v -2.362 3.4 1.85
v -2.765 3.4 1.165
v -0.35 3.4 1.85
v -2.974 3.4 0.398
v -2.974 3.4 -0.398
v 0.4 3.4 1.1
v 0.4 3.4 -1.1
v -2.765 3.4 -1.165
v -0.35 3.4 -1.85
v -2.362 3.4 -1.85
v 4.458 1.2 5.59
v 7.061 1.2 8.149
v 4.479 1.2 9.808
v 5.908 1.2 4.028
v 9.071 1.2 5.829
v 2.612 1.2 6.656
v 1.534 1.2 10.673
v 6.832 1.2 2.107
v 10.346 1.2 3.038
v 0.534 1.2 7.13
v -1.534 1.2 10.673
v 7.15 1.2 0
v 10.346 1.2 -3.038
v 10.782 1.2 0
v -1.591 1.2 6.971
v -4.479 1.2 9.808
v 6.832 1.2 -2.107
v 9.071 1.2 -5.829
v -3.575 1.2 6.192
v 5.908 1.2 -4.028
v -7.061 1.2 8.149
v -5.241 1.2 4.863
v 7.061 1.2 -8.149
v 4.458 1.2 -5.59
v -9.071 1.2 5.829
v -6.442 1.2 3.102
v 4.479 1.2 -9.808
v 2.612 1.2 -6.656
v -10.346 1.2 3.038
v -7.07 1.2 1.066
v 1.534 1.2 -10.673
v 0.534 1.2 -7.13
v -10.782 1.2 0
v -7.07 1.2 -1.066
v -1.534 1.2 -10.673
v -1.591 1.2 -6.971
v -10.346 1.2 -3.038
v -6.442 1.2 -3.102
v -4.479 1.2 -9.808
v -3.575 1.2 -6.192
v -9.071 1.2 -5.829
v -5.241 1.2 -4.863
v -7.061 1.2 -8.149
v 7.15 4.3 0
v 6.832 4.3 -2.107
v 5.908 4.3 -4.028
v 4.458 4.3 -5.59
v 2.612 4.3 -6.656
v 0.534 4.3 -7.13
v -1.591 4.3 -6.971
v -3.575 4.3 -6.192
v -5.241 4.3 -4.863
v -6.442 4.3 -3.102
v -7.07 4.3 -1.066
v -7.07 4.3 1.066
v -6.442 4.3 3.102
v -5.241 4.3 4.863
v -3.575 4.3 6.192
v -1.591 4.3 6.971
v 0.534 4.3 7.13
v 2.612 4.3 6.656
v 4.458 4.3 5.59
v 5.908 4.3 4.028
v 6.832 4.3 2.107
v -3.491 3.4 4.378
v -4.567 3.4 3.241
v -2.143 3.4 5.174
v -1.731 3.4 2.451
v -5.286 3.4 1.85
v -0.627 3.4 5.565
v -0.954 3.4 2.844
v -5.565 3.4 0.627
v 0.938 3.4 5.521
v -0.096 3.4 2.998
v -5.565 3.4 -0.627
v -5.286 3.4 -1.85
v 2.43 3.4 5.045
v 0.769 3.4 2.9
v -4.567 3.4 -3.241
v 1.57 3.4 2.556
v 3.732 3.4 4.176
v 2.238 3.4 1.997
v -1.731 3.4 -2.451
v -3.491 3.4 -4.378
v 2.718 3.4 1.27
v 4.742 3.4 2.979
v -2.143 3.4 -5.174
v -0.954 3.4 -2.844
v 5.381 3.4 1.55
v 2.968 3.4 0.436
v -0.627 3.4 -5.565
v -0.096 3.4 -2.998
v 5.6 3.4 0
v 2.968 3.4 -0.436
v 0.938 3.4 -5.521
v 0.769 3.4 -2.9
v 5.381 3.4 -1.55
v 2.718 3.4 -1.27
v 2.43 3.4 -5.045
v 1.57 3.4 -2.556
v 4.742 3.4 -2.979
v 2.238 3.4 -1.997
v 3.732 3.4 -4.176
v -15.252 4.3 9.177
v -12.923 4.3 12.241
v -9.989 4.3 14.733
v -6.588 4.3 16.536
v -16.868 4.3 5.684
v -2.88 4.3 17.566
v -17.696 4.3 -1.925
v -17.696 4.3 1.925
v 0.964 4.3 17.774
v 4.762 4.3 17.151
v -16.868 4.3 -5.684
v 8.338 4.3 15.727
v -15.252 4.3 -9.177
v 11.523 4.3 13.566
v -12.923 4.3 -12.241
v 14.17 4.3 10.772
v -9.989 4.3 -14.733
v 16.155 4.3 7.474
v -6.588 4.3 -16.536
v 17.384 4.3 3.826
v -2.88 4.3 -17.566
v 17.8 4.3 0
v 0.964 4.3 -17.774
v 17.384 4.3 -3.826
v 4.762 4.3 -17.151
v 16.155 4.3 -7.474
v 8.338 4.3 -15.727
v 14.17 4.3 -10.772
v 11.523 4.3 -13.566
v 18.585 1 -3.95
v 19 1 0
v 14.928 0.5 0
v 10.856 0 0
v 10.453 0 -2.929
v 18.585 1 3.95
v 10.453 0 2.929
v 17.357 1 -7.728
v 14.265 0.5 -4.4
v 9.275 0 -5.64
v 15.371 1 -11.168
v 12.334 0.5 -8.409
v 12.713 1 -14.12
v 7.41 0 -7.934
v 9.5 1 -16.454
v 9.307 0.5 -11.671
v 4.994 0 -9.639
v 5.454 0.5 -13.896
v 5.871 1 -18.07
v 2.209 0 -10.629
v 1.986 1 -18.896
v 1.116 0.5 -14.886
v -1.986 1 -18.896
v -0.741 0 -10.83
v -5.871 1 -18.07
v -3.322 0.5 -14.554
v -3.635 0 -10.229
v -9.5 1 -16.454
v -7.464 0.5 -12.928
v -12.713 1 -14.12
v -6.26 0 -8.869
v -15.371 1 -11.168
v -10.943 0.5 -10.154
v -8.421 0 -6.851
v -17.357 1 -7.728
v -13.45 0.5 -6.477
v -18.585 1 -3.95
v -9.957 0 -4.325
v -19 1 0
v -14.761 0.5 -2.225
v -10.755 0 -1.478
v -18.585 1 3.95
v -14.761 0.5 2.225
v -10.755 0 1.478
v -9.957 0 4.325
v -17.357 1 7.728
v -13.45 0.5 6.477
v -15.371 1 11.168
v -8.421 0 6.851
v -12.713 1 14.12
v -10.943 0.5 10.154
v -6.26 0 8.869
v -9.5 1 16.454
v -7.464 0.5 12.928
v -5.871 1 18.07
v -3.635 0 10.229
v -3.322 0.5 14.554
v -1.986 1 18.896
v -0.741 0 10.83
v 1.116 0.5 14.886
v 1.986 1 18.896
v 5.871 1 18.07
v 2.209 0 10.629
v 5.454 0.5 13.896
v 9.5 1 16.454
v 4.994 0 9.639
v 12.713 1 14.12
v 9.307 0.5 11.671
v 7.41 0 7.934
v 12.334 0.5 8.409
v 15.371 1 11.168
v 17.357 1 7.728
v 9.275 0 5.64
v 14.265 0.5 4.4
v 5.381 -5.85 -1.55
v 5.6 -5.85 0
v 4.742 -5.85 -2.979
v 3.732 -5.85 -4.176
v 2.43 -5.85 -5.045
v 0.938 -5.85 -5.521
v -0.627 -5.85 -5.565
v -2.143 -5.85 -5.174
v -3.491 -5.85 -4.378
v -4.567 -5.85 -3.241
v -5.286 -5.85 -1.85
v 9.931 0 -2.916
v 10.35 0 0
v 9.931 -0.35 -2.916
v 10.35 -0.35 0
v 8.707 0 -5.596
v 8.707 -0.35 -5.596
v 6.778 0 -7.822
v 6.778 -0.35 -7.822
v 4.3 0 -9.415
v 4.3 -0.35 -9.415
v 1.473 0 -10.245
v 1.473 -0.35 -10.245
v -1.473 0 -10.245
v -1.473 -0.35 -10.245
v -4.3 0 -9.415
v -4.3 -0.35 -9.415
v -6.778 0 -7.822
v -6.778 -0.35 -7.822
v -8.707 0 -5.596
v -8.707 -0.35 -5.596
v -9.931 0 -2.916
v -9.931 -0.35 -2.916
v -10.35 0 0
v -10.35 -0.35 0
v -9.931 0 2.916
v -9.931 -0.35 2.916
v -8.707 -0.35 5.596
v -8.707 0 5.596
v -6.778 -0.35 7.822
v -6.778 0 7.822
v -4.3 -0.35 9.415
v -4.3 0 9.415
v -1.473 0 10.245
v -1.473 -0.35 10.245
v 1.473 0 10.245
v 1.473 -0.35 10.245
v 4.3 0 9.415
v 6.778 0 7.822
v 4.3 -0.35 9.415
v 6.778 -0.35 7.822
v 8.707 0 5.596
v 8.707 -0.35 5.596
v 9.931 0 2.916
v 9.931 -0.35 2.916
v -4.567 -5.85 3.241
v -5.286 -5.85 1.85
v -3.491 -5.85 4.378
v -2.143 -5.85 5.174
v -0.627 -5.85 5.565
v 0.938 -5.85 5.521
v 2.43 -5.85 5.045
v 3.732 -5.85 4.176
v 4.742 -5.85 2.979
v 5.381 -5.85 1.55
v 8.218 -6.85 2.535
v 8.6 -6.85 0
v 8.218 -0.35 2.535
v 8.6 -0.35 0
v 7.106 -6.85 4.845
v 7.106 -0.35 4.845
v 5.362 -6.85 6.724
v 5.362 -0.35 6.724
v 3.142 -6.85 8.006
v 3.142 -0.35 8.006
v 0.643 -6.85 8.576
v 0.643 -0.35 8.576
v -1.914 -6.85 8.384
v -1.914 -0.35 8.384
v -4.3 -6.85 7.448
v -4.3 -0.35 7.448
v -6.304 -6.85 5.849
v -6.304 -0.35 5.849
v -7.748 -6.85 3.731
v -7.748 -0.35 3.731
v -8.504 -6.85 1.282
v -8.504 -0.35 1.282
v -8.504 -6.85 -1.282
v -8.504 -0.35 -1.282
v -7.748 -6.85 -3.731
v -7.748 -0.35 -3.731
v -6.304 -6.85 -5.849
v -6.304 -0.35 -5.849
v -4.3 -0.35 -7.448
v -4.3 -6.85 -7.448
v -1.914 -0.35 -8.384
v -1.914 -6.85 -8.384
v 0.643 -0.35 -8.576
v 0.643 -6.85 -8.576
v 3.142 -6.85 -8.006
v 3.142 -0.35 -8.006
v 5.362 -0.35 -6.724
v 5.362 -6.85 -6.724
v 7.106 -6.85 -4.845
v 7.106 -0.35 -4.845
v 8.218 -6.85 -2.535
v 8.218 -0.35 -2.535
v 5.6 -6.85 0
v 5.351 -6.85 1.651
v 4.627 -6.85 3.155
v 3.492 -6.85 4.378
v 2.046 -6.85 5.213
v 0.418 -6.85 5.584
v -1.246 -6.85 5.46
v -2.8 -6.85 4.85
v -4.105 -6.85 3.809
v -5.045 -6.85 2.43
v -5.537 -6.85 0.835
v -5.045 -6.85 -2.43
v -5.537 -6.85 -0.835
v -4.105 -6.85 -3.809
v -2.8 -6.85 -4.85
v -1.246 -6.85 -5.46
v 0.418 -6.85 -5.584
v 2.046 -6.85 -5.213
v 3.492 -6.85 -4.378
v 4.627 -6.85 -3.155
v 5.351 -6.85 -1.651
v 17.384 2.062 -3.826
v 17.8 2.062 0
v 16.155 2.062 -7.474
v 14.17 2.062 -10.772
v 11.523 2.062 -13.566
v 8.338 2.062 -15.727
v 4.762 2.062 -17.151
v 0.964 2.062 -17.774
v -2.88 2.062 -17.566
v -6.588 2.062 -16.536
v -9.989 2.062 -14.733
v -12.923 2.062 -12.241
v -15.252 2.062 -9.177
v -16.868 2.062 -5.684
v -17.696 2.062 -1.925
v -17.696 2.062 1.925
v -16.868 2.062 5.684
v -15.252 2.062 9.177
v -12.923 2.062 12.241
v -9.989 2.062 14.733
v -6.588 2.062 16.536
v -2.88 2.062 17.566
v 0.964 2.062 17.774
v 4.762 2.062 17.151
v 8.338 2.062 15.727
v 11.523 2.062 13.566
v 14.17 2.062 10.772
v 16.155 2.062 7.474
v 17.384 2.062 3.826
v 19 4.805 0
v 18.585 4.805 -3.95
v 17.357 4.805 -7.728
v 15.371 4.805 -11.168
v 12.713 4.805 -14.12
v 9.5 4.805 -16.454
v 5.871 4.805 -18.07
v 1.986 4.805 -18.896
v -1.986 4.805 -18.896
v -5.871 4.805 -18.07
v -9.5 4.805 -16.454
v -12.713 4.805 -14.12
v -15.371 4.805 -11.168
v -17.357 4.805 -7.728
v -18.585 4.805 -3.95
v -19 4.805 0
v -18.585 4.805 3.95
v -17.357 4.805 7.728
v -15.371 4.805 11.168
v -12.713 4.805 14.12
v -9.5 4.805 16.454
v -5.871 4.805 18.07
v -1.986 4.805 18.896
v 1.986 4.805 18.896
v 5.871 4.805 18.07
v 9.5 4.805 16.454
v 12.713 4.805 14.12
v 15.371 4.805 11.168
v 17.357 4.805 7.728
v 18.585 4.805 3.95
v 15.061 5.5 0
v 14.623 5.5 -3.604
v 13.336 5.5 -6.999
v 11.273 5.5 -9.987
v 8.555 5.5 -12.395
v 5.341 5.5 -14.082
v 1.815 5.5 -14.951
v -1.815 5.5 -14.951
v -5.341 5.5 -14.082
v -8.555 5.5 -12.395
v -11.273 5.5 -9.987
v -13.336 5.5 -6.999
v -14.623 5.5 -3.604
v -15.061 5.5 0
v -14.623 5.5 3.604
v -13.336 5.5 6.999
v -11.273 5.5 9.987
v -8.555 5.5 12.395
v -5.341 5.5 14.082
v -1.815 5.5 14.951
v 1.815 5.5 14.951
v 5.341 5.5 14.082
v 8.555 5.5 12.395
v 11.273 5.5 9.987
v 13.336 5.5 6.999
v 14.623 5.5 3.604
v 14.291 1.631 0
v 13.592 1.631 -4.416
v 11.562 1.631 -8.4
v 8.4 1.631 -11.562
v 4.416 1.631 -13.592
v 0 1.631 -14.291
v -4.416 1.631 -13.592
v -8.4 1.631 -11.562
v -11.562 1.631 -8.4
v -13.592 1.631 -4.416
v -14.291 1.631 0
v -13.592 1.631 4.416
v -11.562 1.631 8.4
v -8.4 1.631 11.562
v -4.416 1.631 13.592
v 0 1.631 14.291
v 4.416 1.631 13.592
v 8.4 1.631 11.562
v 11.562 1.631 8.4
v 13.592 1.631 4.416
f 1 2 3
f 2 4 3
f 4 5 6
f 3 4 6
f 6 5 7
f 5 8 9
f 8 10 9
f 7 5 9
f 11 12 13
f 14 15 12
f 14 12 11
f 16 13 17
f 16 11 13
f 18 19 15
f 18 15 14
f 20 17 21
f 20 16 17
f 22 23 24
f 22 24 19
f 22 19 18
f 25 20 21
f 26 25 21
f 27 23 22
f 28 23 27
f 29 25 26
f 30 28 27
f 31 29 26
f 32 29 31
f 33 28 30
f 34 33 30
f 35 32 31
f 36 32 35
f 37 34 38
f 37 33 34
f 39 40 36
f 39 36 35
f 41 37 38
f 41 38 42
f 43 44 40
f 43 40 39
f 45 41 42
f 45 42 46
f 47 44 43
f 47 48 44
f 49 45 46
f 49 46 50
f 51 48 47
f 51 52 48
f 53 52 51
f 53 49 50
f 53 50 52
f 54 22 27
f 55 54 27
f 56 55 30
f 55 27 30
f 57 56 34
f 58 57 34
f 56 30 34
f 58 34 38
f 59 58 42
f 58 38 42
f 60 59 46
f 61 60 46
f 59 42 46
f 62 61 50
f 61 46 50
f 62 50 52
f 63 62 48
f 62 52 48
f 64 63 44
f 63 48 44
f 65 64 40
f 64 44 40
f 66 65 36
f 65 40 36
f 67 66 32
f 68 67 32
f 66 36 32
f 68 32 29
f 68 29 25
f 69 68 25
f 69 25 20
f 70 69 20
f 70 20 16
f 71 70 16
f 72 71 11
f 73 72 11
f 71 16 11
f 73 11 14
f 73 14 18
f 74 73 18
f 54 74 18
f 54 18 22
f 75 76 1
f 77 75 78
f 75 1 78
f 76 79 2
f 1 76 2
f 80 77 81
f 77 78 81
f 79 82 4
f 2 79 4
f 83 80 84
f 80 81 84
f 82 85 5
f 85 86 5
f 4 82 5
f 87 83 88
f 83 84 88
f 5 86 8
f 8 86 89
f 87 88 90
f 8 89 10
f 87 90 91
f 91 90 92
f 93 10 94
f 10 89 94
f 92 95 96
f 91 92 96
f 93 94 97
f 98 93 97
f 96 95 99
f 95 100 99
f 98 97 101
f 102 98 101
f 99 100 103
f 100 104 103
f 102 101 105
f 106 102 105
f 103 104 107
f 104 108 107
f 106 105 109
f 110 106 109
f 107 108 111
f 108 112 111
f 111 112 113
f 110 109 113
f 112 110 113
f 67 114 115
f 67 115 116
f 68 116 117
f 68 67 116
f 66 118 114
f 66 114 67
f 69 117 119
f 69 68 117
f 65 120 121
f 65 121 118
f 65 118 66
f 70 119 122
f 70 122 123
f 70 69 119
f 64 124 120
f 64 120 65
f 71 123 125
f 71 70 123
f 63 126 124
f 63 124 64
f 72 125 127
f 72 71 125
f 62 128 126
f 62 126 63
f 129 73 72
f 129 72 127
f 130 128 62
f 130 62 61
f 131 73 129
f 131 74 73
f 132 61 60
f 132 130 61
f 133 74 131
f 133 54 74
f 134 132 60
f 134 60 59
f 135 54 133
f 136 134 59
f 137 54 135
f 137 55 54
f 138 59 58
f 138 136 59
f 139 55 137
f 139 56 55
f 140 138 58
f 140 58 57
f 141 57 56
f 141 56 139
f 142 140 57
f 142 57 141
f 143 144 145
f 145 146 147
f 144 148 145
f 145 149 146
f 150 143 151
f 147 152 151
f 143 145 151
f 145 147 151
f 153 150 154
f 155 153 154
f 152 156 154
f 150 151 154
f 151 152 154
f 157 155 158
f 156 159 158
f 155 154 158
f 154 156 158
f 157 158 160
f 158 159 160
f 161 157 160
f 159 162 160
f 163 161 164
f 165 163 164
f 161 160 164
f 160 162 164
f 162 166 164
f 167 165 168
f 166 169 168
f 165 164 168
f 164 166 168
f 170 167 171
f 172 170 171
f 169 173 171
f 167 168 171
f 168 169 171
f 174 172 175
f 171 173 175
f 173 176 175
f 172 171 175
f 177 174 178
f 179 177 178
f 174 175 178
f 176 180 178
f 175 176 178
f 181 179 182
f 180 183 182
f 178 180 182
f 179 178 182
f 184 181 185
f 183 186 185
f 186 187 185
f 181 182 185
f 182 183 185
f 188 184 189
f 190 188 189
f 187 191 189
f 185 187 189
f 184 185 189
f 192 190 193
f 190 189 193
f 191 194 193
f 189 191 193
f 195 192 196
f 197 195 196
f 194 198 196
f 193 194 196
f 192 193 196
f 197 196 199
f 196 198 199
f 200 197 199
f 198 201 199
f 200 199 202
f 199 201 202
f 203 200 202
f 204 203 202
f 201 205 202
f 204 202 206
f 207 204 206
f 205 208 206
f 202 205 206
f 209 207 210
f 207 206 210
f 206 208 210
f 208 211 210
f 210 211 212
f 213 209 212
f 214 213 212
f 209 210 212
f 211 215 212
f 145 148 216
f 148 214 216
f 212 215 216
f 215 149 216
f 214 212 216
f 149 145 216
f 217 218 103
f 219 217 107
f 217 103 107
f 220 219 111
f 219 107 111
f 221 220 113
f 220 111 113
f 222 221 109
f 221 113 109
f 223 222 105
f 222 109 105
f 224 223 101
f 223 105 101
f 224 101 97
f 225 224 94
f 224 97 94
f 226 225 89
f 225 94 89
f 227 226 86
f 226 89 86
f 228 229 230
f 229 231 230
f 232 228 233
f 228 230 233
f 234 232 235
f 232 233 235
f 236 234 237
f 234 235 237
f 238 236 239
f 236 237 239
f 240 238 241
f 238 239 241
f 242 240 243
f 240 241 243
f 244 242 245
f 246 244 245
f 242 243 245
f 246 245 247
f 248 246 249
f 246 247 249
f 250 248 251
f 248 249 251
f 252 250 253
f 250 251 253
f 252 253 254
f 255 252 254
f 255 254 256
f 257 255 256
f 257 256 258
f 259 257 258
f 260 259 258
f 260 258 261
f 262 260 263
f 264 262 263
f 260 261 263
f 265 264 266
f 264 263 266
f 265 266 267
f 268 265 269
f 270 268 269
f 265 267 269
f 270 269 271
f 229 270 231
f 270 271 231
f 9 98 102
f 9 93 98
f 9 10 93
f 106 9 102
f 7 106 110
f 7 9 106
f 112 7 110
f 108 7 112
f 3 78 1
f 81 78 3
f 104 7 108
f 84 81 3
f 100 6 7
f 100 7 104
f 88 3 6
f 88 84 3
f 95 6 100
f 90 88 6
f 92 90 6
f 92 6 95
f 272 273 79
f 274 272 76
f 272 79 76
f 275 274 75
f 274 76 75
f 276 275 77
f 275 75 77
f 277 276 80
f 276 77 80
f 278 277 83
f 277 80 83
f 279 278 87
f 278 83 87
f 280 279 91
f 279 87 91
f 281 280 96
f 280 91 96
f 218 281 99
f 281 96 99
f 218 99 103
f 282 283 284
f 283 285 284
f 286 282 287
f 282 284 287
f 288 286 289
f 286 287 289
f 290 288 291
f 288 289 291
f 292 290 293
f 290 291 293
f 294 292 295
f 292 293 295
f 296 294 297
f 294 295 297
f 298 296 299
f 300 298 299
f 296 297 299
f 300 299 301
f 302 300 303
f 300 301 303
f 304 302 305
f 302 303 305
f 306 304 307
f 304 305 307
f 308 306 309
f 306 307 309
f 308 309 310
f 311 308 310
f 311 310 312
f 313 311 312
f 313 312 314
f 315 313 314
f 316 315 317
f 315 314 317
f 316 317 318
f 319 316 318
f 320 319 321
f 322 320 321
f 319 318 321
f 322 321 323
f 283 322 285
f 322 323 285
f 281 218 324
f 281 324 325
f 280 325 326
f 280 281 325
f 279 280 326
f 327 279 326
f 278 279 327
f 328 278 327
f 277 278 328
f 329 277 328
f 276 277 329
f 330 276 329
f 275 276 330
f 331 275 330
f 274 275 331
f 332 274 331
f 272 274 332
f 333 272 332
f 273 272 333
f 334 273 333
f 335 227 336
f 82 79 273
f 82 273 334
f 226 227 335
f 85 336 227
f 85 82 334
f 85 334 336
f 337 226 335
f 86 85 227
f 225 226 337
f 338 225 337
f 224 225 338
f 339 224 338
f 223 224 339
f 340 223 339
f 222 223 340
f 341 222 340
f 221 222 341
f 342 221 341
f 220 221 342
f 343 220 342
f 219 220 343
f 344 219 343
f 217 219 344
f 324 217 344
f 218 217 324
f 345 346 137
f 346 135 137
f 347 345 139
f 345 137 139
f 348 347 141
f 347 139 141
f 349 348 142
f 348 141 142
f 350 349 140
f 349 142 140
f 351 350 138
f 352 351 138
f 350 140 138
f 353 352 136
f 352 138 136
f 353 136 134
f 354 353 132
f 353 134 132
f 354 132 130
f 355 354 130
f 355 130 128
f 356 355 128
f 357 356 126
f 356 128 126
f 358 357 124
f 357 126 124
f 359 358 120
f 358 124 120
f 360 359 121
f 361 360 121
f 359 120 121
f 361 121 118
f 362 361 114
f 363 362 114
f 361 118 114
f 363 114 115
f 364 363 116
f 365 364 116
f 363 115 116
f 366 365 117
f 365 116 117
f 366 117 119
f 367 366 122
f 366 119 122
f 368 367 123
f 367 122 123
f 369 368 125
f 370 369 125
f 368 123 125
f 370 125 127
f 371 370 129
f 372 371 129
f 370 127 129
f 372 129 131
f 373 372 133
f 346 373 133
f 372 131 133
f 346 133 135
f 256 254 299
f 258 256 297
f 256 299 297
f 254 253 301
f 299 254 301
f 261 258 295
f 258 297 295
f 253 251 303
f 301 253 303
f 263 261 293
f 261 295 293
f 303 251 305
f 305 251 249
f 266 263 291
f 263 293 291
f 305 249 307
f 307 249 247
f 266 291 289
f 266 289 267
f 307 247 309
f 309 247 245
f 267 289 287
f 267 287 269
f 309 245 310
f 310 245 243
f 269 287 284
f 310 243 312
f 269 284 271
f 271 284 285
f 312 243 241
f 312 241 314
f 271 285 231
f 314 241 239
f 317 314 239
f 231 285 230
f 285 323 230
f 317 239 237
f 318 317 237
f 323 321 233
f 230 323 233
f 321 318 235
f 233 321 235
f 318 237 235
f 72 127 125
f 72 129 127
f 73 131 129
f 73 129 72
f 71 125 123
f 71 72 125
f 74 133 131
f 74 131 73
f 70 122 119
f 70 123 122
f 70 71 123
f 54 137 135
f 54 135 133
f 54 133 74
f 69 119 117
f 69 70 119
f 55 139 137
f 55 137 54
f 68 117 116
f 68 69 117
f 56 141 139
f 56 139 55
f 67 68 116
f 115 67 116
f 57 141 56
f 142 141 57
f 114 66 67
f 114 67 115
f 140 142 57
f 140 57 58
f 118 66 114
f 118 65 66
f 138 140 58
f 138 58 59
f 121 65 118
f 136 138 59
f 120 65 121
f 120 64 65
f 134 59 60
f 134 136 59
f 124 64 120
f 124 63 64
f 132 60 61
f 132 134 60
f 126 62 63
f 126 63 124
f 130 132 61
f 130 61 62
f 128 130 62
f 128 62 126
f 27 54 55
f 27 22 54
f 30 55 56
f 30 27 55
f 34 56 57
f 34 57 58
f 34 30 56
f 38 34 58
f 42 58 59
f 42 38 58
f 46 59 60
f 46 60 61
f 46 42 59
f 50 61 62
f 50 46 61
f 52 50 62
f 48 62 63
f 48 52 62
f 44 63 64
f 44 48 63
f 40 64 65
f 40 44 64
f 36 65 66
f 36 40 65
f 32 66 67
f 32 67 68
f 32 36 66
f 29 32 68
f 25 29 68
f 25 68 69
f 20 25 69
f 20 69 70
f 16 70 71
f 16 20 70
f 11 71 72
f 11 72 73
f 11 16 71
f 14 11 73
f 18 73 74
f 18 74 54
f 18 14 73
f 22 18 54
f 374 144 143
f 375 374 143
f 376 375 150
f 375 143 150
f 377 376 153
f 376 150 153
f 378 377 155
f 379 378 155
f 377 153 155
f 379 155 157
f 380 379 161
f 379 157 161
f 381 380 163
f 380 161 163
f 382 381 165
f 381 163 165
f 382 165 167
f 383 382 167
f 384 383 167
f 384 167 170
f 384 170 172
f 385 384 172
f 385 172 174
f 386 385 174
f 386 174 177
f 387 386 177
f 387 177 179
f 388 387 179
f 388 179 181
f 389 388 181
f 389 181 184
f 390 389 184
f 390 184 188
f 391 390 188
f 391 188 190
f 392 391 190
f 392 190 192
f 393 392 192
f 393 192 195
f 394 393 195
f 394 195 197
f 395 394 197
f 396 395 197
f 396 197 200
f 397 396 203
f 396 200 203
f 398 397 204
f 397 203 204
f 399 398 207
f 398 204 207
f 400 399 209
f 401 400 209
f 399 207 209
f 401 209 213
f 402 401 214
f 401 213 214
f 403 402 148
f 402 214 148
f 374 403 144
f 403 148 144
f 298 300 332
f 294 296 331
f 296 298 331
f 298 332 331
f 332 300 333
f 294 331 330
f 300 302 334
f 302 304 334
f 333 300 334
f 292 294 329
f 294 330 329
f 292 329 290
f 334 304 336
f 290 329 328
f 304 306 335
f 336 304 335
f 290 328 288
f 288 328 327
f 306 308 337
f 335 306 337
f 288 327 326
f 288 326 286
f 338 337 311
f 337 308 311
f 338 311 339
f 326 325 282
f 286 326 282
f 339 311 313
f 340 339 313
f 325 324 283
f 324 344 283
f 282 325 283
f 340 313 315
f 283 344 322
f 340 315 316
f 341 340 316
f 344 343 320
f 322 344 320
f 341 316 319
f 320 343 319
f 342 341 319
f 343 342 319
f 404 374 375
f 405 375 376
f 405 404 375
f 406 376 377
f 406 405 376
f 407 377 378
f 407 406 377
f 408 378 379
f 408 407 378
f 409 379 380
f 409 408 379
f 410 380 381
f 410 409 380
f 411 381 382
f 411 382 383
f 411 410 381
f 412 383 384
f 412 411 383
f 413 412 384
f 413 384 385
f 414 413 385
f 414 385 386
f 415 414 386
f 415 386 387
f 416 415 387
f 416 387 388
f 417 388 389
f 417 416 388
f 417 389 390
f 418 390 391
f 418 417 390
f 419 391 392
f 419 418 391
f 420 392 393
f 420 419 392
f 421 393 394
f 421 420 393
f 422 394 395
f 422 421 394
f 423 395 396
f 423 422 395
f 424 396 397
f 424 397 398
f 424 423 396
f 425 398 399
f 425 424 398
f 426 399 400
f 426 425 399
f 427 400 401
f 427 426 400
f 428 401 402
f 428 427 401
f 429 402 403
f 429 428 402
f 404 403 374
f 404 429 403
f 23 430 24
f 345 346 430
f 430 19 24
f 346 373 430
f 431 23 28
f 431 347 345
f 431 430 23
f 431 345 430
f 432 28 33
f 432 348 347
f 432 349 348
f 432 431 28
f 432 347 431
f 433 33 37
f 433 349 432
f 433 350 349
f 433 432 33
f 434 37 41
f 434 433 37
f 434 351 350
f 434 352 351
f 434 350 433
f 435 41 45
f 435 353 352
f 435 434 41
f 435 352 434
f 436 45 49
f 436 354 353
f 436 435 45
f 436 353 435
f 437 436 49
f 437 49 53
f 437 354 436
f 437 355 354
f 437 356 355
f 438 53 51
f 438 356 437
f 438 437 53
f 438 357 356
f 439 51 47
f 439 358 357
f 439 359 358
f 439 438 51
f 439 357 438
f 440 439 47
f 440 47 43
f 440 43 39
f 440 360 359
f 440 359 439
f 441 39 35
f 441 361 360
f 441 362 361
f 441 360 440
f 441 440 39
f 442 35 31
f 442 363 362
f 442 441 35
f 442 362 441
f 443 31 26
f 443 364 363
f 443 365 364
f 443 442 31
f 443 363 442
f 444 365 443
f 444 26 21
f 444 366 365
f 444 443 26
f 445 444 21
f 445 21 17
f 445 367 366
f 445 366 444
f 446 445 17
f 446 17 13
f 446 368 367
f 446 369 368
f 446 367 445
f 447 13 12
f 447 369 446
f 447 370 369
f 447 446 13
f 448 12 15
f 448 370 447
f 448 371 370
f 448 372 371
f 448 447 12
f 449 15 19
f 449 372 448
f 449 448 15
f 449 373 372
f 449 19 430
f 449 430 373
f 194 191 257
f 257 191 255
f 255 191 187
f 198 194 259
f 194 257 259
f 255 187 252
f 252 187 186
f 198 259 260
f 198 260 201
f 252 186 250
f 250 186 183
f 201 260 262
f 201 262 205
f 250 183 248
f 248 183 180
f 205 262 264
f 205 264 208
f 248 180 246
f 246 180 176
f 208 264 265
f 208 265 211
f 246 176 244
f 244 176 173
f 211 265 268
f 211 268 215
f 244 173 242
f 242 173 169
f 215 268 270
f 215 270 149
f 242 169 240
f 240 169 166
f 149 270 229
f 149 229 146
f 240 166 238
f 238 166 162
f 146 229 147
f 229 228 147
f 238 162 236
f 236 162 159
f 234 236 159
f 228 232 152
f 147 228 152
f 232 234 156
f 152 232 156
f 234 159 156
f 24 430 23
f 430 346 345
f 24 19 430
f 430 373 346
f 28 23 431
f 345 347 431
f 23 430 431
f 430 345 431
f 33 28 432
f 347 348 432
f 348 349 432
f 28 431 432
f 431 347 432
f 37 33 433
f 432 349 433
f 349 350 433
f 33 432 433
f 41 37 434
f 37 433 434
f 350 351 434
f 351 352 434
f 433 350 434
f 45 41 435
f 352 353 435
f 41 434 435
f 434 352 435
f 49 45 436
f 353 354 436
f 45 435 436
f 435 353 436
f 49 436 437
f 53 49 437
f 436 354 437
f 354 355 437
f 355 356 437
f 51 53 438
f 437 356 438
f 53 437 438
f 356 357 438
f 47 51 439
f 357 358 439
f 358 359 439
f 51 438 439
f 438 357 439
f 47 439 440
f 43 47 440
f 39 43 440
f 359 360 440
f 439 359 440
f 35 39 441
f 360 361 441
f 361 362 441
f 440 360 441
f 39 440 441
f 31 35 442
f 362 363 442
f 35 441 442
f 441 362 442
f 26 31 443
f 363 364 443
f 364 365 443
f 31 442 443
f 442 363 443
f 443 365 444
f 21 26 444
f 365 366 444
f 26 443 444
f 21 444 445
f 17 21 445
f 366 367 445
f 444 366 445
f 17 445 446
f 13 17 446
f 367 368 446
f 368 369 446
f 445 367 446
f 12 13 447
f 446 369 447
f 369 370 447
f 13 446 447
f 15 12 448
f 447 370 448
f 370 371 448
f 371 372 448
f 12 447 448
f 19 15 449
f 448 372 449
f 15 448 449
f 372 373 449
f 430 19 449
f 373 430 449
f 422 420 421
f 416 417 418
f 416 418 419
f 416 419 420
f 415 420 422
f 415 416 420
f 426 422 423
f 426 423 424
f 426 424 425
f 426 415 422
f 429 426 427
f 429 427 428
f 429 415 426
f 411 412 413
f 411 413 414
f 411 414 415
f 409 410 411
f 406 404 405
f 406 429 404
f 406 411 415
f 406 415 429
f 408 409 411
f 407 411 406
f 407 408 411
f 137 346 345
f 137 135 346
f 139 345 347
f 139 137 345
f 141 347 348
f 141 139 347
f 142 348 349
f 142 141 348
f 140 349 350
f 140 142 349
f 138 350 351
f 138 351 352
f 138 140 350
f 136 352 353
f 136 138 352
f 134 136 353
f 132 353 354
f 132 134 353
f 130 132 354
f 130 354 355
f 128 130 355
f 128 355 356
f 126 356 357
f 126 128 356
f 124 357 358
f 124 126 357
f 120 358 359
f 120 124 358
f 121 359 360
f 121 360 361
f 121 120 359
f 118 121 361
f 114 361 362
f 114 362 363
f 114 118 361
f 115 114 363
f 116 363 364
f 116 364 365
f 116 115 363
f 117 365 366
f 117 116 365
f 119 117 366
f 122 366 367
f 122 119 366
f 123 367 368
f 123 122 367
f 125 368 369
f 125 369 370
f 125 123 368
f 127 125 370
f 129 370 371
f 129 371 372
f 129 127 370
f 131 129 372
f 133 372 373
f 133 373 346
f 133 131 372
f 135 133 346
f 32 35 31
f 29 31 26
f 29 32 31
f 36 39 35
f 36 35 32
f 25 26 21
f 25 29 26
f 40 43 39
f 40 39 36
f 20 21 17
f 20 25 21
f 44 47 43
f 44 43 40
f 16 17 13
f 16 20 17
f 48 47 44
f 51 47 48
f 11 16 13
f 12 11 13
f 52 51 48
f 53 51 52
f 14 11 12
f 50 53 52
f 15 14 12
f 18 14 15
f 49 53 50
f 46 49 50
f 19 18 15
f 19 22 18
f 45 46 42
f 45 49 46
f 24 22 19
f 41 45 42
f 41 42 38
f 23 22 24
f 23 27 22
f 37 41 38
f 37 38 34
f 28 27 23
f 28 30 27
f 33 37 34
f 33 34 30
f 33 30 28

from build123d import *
from build123d.topology import SkipClean

# Parameters (mm, degrees)
CHAMFER2_SIZE           = 1
CHAMFER2_SIZE2          = 8.144346428
CUT_EXTRUDE1_DEPTH      = 28.792265111
CUT_EXTRUDE1_DEPTH_BACK = 5
CHAMFER1_SIZE           = 1
CHAMFER3_SIZE           = 0.5
CHAMFER3_SIZE2          = 0.288675135
SKETCH6_R               = 8.6
SKETCH6_R_2             = 5.6
BOSS_EXTRUDE1_DEPTH     = 10.25
CUT_EXTRUDE3_START      = 5
SKETCH7_R               = 3
CUT_EXTRUDE3_DEPTH      = 5
SHELL6_2_OUTLINE_W      = 7.15
SHELL6_2_OUTLINE_H      = 0.3
SKETCH9_R               = 9.15
SKETCH9_R_2             = 7.15
BOSS_EXTRUDE3_DEPTH     = 0.35


with BuildPart() as part:
    # Sketch1 → Revolve1 (revolve)
    with BuildSketch(Plane.XY, mode=Mode.PRIVATE) as revolve1_sk:
        Polygon((-15.060768988, 5.5), (-19, 4.805407289), (-19, 0), (-10.35, 0), (-10.35, -0.35), (-8.6, -0.35), (-8.6, -6.85), (-5.6, -6.85), (-5.6, 3.4), (-3, 3.4), (-3, -1.6), (0, -1.6), (0, 5.5), align=None)
    revolve(revolve1_sk.sketch.rotate(Axis((0, -1.6, 0), (0, 1, 0)), 180), axis=Axis((0, -1.6, 0), (0, 1, 0)))

    # Chamfer2
    chamfer2_edges = [part.edges().sort_by_distance(p)[0] for p in [
        (-19, 0, 0),
    ]]
    chamfer2_side = [part.faces().sort_by_distance(p)[0] for p in [
        (-19, 2.402703645, 0),
    ]]
    chamfer(chamfer2_edges, length=CHAMFER2_SIZE, length2=CHAMFER2_SIZE2, reference=chamfer2_side[0])

    # Sketch2 → Cut-Extrude1 (cut, two sides: drawn at the far end of the back side and taken through both)
    with BuildSketch(Plane.XZ.offset(1.6).offset(-CUT_EXTRUDE1_DEPTH_BACK)):
        Polygon((-5.85, 1.85), (-6.6, 1.1), (-6.6, -1.1), (-5.85, -1.85), (-0.35, -1.85), (0.4, -1.1), (0.4, 1.1), (-0.35, 1.85), align=None)
    extrude(amount=CUT_EXTRUDE1_DEPTH + CUT_EXTRUDE1_DEPTH_BACK, mode=Mode.SUBTRACT)

    # Chamfer1
    chamfer1_edges = [part.edges().sort_by_distance(p)[0] for p in [
        (5.6, -6.85, 0),
    ]]
    chamfer(chamfer1_edges, length=CHAMFER1_SIZE)

    # Chamfer3
    chamfer3_edges = [part.edges().sort_by_distance(p)[0] for p in [
        (-8.6, -6.85, 0),
    ]]
    chamfer3_side = [part.faces().sort_by_distance(p)[0] for p in [
        (-8.6, -3.6, 0),
    ]]
    chamfer(chamfer3_edges, length=CHAMFER3_SIZE, length2=CHAMFER3_SIZE2, reference=chamfer3_side[0])

    # Sketch6 → Boss-Extrude1 (add)
    with SkipClean():  # the faces are left unmerged after this step: merging them gives an invalid solid
        with BuildSketch(Plane.XZ.offset(-3.4)):
            Circle(SKETCH6_R)
            Circle(SKETCH6_R_2, mode=Mode.SUBTRACT)
        extrude(amount=BOSS_EXTRUDE1_DEPTH)

    # Sketch7 → Cut-Extrude3 (cut)
    with SkipClean():  # the faces are left unmerged after this step: merging them gives an invalid solid
        with BuildSketch(Plane.XZ.offset(-3.4).offset(CUT_EXTRUDE3_START)):
            Circle(SKETCH7_R)
        extrude(amount=-CUT_EXTRUDE3_DEPTH, mode=Mode.SUBTRACT)


with BuildPart() as body_2:
    # Split1: the piece on the far side of the plane
    add(part.part)
    split(bisect_by=Plane(origin=(0, 4.3, 0), x_dir=(1, 0, 0), z_dir=(0, 1, 0)), keep=Keep.BOTTOM)

    # Shell6: read off the stored shape, not the designer's step
    # Shell6 outline → Shell6 (revolve, cut)
    with SkipClean():  # the faces are left unmerged after this step: merging them gives an invalid solid
        with BuildSketch(Plane.XY):
            Polygon((7.15, 4.3), (7.15, 0.85), (9.15, 0.85), (9.15, 1.2), (10.782258428, 1.2), (17.8, 2.061670317), (17.8, 4.3), align=None)
        revolve(axis=Axis((0, 0, 0), (0, 1, 0)), mode=Mode.SUBTRACT)

    # Shell6 2 outline → Shell6 2 (revolve)
    with SkipClean():  # the faces are left unmerged after this step: merging them gives an invalid solid
        with BuildSketch(Plane.XY):
            with Locations((3.575, 4.45)):
                Rectangle(SHELL6_2_OUTLINE_W, SHELL6_2_OUTLINE_H)
        revolve(axis=Axis((0, 0, 0), (0, 1, 0)))

    # Sketch9 → Boss-Extrude3 (add)
    with SkipClean():  # the faces are left unmerged after this step: merging them gives an invalid solid
        with BuildSketch(Plane(origin=(0, 0.85, 0), x_dir=(1, 0, 0), z_dir=(0, 1, 0))):
            Circle(SKETCH9_R)
            Circle(SKETCH9_R_2, mode=Mode.SUBTRACT)
        extrude(amount=BOSS_EXTRUDE3_DEPTH)


with BuildPart() as part_1:
    add(part.part)

    # Split1
    split(bisect_by=Plane(origin=(0, 4.3, 0), x_dir=(1, 0, 0), z_dir=(0, 1, 0)), keep=Keep.TOP)


with BuildPart() as body_3:
    # Intersect1: read off the stored shape, not the designer's step
    # Intersect1 outline → Intersect1 (revolve)
    with BuildSketch(Plane.XY):
        Polygon((17.8, 4.3), (7.15, 4.3), (7.15, 1.2), (10.782258428, 1.2), (17.8, 2.061670317), align=None)
    revolve(axis=Axis((0, 0, 0), (0, 1, 0)))


with BuildPart() as body_4:
    # Intersect1 2 outline → Intersect1 2 (revolve)
    with BuildSketch(Plane.XY):
        Polygon((7.15, 4.6), (7.15, 4.3), (19, 4.3), (19, 4.805407289), (15.060768988, 5.5), (0, 5.5), (0, 4.6), align=None)
    revolve(axis=Axis((0, 0, 0), (0, 1, 0)))

    # Combine1: union body 2
    add(body_2.part)


solid = Compound([body_3.part, body_4.part])
